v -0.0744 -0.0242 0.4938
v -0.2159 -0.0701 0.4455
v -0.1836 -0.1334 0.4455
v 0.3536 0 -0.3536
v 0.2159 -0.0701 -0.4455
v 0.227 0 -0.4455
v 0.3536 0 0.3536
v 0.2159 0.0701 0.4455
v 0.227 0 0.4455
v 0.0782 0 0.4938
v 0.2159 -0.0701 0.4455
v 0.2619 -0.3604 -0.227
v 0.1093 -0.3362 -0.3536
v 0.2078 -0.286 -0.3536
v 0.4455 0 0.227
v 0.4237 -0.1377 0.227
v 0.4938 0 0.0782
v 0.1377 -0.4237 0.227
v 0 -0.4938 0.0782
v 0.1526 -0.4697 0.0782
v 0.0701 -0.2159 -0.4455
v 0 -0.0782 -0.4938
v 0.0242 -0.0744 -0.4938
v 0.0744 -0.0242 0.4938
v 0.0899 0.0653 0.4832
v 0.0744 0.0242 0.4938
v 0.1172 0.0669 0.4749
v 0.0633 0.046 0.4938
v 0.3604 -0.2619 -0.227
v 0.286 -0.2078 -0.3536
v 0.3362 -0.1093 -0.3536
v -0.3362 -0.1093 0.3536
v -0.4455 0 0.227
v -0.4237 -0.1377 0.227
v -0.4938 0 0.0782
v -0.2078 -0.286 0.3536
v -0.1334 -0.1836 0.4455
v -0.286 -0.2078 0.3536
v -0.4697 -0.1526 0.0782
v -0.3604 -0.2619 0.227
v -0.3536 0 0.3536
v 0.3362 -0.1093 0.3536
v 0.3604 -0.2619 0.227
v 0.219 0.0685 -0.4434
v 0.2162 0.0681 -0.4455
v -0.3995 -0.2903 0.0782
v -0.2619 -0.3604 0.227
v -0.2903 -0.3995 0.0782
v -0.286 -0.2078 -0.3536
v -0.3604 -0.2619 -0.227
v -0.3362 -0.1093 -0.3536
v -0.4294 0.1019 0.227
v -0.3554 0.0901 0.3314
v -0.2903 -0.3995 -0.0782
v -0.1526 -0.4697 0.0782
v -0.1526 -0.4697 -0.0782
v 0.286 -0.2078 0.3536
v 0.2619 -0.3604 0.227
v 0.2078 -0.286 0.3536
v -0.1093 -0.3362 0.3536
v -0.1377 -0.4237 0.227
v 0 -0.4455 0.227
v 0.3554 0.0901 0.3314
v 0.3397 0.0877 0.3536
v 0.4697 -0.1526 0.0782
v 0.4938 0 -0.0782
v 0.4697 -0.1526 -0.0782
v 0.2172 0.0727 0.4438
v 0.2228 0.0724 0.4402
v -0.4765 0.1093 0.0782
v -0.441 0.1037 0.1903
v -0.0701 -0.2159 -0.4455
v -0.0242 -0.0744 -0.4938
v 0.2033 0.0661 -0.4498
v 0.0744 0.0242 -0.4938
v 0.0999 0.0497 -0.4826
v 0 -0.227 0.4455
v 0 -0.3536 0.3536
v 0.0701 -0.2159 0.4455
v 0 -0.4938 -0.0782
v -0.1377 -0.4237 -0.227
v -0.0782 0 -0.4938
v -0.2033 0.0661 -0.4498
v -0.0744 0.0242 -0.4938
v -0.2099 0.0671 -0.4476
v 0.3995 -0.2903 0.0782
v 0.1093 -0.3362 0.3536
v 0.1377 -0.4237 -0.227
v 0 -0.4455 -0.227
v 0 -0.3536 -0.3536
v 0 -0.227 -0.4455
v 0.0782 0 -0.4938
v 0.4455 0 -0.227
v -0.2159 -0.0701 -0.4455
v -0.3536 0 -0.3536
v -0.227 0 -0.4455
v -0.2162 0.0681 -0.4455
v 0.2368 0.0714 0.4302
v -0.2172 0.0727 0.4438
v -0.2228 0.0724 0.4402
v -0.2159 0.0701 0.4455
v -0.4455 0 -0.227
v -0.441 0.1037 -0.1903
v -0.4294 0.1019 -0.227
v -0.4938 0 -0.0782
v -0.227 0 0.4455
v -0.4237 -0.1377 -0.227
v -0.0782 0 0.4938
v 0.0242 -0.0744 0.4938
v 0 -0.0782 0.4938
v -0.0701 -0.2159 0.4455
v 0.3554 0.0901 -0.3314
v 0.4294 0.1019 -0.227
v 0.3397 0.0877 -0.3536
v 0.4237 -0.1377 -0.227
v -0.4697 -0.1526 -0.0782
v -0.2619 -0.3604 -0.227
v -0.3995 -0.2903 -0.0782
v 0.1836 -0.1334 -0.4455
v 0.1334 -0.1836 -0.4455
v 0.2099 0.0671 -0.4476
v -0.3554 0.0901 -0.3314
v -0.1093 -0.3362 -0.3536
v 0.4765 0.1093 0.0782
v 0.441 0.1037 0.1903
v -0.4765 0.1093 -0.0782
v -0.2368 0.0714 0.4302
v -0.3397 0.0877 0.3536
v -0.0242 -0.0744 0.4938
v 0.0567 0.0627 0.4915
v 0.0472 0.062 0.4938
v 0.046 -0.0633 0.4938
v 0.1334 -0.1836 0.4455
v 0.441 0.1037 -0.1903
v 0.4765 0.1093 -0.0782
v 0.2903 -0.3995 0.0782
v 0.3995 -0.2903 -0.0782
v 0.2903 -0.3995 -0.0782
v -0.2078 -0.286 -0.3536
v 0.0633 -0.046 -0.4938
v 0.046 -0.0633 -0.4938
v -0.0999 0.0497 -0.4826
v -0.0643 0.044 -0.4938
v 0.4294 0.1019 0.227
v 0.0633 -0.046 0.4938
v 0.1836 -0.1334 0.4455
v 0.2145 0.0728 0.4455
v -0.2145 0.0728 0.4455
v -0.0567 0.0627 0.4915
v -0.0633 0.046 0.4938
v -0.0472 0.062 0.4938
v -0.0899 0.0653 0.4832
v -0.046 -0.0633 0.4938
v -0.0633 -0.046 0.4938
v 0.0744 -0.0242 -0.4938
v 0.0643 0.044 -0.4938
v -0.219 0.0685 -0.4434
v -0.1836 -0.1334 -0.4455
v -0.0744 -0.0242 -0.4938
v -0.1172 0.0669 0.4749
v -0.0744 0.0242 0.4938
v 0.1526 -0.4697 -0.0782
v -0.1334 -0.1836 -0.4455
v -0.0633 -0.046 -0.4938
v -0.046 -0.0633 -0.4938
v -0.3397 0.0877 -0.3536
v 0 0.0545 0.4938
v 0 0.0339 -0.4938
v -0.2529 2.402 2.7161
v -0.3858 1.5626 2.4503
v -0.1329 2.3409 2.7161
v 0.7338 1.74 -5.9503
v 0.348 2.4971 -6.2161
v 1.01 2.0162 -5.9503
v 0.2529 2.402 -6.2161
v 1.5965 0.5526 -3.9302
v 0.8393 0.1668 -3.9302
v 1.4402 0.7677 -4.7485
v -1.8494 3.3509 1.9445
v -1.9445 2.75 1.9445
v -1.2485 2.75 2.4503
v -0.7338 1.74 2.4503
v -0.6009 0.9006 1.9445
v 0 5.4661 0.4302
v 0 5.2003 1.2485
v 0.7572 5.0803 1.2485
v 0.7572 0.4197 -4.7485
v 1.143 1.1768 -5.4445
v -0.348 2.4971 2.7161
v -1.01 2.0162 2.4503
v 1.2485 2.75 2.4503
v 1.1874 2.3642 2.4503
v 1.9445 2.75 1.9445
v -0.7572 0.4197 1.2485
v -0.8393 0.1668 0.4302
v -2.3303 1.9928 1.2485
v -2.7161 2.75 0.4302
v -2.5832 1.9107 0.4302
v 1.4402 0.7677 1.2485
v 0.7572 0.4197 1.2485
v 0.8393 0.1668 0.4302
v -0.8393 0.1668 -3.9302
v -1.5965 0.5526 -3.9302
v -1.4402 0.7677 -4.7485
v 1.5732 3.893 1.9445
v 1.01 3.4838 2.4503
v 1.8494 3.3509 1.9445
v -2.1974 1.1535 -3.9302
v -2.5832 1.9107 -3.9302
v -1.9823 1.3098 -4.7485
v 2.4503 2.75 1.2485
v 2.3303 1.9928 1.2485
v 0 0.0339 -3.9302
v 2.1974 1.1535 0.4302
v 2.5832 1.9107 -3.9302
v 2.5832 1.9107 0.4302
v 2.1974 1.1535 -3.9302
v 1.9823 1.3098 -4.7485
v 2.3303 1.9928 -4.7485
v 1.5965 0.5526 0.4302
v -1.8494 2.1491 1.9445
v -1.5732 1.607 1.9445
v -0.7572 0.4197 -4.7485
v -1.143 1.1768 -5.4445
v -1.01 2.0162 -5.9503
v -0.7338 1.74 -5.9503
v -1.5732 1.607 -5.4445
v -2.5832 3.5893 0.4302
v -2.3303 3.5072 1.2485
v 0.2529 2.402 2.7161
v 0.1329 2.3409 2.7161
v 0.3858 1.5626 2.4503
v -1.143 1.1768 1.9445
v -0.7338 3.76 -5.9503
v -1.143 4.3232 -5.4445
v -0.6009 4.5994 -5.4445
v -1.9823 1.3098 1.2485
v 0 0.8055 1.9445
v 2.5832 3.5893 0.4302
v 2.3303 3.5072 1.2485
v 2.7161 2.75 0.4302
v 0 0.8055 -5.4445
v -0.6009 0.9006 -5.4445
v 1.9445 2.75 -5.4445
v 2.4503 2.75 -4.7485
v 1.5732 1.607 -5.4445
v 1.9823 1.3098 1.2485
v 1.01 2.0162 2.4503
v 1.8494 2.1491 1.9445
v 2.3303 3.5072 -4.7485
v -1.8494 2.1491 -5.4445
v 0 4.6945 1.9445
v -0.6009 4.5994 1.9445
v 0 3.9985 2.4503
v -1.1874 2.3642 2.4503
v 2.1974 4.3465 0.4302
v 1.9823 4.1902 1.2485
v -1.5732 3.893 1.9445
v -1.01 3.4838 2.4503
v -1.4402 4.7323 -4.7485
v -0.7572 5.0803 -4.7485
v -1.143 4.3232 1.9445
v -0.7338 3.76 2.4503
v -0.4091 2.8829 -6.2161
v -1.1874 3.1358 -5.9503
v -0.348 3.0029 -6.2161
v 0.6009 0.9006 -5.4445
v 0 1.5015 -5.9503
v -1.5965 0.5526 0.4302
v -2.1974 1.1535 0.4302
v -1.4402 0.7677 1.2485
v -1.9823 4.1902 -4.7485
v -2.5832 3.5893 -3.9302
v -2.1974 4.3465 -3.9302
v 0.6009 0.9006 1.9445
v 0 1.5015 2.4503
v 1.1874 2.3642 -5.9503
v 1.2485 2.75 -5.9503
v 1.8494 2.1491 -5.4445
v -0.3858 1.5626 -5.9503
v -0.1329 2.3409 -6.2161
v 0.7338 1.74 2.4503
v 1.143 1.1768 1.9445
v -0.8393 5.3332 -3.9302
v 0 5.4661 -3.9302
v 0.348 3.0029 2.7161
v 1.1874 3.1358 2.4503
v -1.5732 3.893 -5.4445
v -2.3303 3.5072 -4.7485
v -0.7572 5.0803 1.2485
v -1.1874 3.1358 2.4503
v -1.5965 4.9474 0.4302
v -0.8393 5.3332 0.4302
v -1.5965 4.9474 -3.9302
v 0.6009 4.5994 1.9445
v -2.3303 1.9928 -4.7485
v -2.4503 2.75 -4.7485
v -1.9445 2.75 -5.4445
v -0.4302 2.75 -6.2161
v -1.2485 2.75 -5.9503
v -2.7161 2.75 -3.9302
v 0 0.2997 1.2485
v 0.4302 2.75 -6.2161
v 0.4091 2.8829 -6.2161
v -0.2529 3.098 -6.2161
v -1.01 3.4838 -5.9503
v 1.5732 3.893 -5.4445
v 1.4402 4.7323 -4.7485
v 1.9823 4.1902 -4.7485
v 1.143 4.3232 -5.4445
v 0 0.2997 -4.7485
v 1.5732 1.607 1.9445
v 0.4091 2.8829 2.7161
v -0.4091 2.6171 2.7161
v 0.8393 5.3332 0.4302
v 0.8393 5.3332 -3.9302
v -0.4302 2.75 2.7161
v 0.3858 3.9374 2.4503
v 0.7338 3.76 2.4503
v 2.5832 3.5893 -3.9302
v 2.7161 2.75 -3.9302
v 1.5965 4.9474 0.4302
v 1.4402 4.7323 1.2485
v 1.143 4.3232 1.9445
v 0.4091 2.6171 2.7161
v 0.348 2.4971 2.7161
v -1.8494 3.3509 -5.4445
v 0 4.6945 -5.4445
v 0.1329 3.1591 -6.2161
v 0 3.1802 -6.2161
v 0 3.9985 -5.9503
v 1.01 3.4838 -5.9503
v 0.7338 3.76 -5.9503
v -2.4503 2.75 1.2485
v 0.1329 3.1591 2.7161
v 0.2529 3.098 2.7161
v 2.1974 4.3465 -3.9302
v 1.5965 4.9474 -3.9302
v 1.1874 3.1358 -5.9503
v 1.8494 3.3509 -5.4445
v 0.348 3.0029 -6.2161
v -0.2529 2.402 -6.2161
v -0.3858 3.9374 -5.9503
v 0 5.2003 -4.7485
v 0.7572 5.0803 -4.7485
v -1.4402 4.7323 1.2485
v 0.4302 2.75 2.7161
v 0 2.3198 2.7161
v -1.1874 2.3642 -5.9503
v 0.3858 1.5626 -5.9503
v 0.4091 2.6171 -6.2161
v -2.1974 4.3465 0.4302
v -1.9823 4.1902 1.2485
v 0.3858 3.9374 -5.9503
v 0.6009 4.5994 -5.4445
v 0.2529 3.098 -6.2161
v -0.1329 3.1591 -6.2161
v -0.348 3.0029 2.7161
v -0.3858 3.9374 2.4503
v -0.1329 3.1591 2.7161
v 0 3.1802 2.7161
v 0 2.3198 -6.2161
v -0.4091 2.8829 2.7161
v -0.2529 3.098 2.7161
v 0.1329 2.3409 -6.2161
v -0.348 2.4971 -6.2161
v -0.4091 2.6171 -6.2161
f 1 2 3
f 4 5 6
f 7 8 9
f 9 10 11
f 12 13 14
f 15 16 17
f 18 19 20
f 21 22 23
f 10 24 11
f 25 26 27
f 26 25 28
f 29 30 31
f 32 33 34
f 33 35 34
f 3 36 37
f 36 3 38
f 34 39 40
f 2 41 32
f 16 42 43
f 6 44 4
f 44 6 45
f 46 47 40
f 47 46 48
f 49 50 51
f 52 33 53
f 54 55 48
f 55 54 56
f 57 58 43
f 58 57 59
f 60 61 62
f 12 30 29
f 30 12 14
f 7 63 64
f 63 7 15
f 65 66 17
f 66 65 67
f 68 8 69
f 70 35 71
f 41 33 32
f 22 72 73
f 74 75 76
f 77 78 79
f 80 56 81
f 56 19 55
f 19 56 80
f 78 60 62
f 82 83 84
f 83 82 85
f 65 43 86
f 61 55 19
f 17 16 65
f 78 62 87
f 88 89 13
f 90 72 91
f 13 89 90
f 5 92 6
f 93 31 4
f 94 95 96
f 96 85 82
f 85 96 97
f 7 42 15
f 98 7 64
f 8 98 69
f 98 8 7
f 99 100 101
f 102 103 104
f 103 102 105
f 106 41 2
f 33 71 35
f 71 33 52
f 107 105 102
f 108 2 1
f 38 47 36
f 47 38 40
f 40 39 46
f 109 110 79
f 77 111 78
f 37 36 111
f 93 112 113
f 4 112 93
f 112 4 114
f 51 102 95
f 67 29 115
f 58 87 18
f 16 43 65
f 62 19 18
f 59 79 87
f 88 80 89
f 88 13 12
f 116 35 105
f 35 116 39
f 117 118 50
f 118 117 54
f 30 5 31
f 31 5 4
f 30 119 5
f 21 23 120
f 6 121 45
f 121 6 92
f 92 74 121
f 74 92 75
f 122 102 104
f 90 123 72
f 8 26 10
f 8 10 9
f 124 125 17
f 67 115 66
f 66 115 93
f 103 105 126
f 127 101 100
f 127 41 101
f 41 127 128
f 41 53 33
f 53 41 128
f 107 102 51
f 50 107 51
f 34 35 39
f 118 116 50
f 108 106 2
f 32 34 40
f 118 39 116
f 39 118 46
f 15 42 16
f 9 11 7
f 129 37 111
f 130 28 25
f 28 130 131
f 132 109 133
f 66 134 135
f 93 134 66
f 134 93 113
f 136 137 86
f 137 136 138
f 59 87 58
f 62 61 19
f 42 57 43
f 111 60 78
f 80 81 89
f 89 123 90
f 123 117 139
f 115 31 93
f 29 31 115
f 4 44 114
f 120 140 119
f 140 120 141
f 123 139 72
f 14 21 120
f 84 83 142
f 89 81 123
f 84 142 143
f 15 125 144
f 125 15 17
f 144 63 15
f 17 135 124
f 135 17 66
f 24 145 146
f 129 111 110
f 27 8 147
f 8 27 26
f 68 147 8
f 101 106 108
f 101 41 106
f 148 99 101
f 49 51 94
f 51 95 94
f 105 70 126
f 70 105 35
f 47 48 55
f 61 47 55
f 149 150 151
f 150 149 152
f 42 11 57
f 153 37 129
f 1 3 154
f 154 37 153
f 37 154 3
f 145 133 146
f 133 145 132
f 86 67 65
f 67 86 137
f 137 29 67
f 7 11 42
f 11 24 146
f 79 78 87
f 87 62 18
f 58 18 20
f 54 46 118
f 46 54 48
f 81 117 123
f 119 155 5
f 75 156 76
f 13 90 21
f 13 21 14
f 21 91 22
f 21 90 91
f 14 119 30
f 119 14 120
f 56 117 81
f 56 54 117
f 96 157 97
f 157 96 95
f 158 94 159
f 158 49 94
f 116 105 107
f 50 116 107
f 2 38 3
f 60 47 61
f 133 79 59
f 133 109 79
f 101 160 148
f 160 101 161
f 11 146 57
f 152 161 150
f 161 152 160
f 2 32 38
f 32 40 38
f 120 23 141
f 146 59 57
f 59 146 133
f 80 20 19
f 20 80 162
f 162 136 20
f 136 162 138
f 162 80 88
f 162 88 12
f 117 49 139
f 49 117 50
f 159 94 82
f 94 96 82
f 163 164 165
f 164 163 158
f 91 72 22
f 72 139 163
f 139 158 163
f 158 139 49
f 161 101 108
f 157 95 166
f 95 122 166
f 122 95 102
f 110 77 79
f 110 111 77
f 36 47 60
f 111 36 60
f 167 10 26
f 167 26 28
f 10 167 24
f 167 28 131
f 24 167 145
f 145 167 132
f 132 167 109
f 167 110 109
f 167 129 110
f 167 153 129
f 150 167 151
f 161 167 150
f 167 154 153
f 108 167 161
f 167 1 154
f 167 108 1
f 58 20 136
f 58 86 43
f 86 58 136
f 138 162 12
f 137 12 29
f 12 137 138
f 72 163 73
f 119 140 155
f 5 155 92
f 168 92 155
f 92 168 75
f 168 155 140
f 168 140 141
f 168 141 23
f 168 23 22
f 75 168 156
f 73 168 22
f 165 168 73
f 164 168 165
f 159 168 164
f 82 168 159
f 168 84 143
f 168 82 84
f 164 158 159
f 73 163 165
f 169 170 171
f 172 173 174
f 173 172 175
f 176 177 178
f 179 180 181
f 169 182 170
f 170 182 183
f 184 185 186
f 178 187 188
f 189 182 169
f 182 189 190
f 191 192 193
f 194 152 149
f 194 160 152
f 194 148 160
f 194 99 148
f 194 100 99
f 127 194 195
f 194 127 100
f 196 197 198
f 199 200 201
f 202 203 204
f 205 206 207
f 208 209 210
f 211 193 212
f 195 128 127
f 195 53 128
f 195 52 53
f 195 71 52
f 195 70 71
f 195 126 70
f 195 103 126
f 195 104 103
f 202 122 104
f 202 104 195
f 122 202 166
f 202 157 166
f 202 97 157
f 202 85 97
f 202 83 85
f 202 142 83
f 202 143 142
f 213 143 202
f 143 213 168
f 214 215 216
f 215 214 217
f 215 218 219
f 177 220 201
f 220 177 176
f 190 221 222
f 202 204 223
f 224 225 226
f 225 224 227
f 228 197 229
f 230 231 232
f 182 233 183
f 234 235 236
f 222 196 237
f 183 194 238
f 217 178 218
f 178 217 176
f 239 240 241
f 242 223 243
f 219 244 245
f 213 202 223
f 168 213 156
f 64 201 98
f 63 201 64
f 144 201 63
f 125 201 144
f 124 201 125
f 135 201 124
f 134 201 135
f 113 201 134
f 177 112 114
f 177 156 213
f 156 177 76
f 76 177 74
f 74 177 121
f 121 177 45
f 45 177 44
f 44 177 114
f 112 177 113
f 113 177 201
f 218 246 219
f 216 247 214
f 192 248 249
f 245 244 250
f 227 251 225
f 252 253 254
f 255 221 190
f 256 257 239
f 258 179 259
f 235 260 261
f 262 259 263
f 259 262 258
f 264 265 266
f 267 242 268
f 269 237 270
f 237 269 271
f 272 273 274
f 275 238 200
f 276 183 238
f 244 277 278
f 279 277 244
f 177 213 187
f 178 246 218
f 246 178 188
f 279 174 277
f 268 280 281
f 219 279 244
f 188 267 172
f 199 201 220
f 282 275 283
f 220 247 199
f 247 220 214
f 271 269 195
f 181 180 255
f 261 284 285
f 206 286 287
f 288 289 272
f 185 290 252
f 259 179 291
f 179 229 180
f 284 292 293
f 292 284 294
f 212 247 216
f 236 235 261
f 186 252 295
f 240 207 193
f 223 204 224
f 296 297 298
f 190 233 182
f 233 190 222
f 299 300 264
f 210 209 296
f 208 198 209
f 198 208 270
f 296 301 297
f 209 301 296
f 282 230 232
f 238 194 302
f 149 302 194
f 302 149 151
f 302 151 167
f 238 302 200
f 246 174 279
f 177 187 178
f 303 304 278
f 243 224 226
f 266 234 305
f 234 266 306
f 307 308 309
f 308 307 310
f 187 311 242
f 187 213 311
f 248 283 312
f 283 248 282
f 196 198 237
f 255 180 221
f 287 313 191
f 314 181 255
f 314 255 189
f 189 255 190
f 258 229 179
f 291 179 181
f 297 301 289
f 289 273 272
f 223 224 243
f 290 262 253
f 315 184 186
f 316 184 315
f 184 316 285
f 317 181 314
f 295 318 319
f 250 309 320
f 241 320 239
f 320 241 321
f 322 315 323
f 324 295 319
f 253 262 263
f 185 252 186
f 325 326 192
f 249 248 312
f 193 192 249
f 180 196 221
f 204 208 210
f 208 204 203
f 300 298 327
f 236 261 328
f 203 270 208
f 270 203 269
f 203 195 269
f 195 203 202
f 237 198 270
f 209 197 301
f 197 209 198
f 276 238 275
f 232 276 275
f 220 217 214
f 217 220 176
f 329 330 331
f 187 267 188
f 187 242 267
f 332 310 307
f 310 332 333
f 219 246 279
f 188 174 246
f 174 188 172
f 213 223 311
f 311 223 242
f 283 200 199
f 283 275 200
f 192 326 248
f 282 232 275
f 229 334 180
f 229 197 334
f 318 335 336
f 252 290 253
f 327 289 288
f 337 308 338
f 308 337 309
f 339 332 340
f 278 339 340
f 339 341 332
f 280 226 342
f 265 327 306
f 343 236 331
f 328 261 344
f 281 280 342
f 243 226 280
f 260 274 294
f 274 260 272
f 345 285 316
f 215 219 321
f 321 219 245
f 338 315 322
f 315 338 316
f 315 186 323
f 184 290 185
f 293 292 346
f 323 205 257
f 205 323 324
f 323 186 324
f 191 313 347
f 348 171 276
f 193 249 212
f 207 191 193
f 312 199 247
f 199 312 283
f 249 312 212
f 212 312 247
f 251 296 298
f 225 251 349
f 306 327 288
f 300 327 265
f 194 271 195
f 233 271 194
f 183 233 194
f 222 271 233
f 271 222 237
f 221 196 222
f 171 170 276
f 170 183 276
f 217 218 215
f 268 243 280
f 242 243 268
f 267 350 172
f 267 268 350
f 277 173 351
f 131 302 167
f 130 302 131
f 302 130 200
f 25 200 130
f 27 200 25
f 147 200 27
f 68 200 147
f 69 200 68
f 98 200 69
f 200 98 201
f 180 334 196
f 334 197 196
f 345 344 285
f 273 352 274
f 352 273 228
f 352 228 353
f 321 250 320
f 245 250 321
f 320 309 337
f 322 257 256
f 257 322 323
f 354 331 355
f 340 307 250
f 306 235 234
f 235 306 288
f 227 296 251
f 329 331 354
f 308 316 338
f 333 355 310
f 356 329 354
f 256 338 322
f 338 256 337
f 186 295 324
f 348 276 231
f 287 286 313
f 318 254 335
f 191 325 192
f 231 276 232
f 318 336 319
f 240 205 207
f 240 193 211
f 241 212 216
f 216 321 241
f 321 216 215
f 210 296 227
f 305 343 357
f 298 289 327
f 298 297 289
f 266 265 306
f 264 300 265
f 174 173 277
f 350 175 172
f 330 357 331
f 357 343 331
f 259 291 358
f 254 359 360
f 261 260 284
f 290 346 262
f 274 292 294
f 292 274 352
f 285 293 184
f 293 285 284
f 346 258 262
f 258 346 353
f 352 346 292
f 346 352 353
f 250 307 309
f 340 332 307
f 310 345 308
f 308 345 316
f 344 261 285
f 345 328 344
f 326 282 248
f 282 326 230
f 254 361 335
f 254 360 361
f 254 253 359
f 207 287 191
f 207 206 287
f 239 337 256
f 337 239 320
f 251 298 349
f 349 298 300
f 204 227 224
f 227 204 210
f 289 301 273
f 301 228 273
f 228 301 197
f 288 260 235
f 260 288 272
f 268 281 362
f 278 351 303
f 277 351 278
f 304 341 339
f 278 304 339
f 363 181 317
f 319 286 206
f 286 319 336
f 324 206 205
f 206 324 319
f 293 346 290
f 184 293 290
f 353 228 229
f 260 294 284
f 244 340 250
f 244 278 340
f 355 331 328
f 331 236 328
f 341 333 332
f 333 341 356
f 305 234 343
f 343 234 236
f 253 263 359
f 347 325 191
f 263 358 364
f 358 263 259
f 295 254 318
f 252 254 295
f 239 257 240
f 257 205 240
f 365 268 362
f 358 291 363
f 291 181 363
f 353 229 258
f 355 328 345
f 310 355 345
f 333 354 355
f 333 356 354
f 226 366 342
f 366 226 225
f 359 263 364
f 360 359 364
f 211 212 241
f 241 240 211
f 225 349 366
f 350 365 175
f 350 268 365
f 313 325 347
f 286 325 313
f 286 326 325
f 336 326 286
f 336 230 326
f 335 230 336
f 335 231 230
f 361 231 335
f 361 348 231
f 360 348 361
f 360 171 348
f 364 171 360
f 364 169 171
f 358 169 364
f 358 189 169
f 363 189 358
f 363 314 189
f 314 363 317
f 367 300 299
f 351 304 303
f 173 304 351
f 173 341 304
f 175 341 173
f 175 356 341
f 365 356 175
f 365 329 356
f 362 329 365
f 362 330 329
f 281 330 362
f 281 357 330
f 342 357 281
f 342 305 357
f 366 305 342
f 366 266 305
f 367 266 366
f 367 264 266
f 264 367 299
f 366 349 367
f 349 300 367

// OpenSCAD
/**
 * Martin Egli
 * 2021-09-27
 * cast a lego mini figure from choclate
 */
res = 20;

module legoHead(loc_res = 20, show_origin = 1, show_face = 1) {
    if(show_origin) {
        translate([0, 0, 0])
        sphere(d = 1, $fn = loc_res);
    }
    difference()
    {
        union() 
        {
            // lower receiver
            translate([0, 0, 0])
            cylinder(d = 6.5, h = 1, $fn = loc_res);
            
            minkowski()
            {
                translate([0, 0, 2+1])
                cylinder(d = 10-2-2, h = 8.5-2-2, $fn = loc_res);
                
                sphere(r = 2, $fn = loc_res);
            }
            // upper plug
            translate([0, 0, 0])
            cylinder(d = 5, h = 11, $fn = loc_res);
        }
        if(show_face) {
            // eyes
            a1 = 25;
            translate([5*cos(+a1), 5*sin(+a1), 6.5])
            sphere(d = 1, $fn = loc_res);
            translate([5*cos(-a1), 5*sin(-a1), 6.5])
            sphere(d = 1, $fn = loc_res);
            
            // mouth
            a1 =20;
            for(n = [0:1:40]) {
                translate([5*cos(-a1+n), 5*sin(-a1+n), -6*sin(90-20+n)+2.15*4.5])
                sphere(d = 1, $fn = loc_res);
            }
            /*translate([5*cos(+a1), 5*sin(+a1), 4.5])
            sphere(d = 1.5, $fn = loc_res);
            translate([5*cos(-a1), 5*sin(-a1), 4.5])
            sphere(d = 1.5, $fn = loc_res);*/
        }
    }
}

module legoBody(loc_res = 20, show_origin = 1) {
    if(show_origin) {
        translate([0, 0, 0])
        sphere(d = 1, $fn = loc_res);
    }
    hull()
    {
        rad1 = 0.5;
        // lower
        translate([-8/2+rad1, -15/2+rad1, 0+rad1])
        sphere(r = rad1, $fn = loc_res);
        translate([-8/2+rad1, +15/2-rad1, 0+rad1])
        sphere(r = rad1, $fn = loc_res);
        translate([+8/2-rad1, -15/2+rad1, 0+rad1])
        sphere(r = rad1, $fn = loc_res);
        translate([+8/2-rad1, +15/2-rad1, 0+rad1])
        sphere(r = rad1, $fn = loc_res);
        
        // upper
        translate([-8/2+rad1, -11/2+rad1, 13-rad1])
        sphere(r = rad1, $fn = loc_res);
        translate([-8/2+rad1, +11/2-rad1, 13-rad1])
        sphere(r = rad1, $fn = loc_res);
        translate([+8/2-rad1, -11/2+rad1, 13-rad1])
        sphere(r = rad1, $fn = loc_res);
        translate([+8/2-rad1, +11/2-rad1, 13-rad1])
        sphere(r = rad1, $fn = loc_res);
    }
}

module legoLegs(loc_res = 20, show_origin = 1) {
    if(show_origin) {
        translate([0, 0, 0])
        sphere(d = 1, $fn = loc_res);
    }
    // left leg
    translate([-4, 0.5, 0]) {
        cube([8, 7, 3]);
        cube([5.5, 7, 11]);
    }
    // right leg
    translate([-4, -8+0.5, 0]) {
        cube([8, 7, 3]);
        cube([5.5, 7, 11]);
    }
    
    translate([0, -8+0.5, 16-2-4+1])
    rotate([-90, 0, 0])
    cylinder(r = 4, h = 15, $fn = loc_res);
    
    translate([-4, -8+0.5, 16-2])
    cube([8, 15, 2]);
}

module legoArm(loc_res = 20, show_origin = 1) {
    if(show_origin) {
        translate([0, 0, 0])
        sphere(d = 1, $fn = loc_res);
    }
    hull() {
    translate([0, 5.5/2, 0])
    sphere(d = 5.5, $fn = loc_res);
    translate([0, 5.5/2, -9+5.5])
    sphere(d = 5.5, $fn = loc_res);
    }
}
module legoFigure(loc_res = 20, show_origin = 1) {
    if(show_origin) {
        translate([0, 0, 0])
        sphere(d = 1, $fn = loc_res);
    }
    translate([0, 0, 16+13])
    legoHead(loc_res, show_origin, 1);
    translate([0, 0, 16])
    legoBody(loc_res, show_origin);
    translate([0, 0, 0])
    legoLegs(loc_res, show_origin);
}
//legoFigure(20, 0);
legoArm();
